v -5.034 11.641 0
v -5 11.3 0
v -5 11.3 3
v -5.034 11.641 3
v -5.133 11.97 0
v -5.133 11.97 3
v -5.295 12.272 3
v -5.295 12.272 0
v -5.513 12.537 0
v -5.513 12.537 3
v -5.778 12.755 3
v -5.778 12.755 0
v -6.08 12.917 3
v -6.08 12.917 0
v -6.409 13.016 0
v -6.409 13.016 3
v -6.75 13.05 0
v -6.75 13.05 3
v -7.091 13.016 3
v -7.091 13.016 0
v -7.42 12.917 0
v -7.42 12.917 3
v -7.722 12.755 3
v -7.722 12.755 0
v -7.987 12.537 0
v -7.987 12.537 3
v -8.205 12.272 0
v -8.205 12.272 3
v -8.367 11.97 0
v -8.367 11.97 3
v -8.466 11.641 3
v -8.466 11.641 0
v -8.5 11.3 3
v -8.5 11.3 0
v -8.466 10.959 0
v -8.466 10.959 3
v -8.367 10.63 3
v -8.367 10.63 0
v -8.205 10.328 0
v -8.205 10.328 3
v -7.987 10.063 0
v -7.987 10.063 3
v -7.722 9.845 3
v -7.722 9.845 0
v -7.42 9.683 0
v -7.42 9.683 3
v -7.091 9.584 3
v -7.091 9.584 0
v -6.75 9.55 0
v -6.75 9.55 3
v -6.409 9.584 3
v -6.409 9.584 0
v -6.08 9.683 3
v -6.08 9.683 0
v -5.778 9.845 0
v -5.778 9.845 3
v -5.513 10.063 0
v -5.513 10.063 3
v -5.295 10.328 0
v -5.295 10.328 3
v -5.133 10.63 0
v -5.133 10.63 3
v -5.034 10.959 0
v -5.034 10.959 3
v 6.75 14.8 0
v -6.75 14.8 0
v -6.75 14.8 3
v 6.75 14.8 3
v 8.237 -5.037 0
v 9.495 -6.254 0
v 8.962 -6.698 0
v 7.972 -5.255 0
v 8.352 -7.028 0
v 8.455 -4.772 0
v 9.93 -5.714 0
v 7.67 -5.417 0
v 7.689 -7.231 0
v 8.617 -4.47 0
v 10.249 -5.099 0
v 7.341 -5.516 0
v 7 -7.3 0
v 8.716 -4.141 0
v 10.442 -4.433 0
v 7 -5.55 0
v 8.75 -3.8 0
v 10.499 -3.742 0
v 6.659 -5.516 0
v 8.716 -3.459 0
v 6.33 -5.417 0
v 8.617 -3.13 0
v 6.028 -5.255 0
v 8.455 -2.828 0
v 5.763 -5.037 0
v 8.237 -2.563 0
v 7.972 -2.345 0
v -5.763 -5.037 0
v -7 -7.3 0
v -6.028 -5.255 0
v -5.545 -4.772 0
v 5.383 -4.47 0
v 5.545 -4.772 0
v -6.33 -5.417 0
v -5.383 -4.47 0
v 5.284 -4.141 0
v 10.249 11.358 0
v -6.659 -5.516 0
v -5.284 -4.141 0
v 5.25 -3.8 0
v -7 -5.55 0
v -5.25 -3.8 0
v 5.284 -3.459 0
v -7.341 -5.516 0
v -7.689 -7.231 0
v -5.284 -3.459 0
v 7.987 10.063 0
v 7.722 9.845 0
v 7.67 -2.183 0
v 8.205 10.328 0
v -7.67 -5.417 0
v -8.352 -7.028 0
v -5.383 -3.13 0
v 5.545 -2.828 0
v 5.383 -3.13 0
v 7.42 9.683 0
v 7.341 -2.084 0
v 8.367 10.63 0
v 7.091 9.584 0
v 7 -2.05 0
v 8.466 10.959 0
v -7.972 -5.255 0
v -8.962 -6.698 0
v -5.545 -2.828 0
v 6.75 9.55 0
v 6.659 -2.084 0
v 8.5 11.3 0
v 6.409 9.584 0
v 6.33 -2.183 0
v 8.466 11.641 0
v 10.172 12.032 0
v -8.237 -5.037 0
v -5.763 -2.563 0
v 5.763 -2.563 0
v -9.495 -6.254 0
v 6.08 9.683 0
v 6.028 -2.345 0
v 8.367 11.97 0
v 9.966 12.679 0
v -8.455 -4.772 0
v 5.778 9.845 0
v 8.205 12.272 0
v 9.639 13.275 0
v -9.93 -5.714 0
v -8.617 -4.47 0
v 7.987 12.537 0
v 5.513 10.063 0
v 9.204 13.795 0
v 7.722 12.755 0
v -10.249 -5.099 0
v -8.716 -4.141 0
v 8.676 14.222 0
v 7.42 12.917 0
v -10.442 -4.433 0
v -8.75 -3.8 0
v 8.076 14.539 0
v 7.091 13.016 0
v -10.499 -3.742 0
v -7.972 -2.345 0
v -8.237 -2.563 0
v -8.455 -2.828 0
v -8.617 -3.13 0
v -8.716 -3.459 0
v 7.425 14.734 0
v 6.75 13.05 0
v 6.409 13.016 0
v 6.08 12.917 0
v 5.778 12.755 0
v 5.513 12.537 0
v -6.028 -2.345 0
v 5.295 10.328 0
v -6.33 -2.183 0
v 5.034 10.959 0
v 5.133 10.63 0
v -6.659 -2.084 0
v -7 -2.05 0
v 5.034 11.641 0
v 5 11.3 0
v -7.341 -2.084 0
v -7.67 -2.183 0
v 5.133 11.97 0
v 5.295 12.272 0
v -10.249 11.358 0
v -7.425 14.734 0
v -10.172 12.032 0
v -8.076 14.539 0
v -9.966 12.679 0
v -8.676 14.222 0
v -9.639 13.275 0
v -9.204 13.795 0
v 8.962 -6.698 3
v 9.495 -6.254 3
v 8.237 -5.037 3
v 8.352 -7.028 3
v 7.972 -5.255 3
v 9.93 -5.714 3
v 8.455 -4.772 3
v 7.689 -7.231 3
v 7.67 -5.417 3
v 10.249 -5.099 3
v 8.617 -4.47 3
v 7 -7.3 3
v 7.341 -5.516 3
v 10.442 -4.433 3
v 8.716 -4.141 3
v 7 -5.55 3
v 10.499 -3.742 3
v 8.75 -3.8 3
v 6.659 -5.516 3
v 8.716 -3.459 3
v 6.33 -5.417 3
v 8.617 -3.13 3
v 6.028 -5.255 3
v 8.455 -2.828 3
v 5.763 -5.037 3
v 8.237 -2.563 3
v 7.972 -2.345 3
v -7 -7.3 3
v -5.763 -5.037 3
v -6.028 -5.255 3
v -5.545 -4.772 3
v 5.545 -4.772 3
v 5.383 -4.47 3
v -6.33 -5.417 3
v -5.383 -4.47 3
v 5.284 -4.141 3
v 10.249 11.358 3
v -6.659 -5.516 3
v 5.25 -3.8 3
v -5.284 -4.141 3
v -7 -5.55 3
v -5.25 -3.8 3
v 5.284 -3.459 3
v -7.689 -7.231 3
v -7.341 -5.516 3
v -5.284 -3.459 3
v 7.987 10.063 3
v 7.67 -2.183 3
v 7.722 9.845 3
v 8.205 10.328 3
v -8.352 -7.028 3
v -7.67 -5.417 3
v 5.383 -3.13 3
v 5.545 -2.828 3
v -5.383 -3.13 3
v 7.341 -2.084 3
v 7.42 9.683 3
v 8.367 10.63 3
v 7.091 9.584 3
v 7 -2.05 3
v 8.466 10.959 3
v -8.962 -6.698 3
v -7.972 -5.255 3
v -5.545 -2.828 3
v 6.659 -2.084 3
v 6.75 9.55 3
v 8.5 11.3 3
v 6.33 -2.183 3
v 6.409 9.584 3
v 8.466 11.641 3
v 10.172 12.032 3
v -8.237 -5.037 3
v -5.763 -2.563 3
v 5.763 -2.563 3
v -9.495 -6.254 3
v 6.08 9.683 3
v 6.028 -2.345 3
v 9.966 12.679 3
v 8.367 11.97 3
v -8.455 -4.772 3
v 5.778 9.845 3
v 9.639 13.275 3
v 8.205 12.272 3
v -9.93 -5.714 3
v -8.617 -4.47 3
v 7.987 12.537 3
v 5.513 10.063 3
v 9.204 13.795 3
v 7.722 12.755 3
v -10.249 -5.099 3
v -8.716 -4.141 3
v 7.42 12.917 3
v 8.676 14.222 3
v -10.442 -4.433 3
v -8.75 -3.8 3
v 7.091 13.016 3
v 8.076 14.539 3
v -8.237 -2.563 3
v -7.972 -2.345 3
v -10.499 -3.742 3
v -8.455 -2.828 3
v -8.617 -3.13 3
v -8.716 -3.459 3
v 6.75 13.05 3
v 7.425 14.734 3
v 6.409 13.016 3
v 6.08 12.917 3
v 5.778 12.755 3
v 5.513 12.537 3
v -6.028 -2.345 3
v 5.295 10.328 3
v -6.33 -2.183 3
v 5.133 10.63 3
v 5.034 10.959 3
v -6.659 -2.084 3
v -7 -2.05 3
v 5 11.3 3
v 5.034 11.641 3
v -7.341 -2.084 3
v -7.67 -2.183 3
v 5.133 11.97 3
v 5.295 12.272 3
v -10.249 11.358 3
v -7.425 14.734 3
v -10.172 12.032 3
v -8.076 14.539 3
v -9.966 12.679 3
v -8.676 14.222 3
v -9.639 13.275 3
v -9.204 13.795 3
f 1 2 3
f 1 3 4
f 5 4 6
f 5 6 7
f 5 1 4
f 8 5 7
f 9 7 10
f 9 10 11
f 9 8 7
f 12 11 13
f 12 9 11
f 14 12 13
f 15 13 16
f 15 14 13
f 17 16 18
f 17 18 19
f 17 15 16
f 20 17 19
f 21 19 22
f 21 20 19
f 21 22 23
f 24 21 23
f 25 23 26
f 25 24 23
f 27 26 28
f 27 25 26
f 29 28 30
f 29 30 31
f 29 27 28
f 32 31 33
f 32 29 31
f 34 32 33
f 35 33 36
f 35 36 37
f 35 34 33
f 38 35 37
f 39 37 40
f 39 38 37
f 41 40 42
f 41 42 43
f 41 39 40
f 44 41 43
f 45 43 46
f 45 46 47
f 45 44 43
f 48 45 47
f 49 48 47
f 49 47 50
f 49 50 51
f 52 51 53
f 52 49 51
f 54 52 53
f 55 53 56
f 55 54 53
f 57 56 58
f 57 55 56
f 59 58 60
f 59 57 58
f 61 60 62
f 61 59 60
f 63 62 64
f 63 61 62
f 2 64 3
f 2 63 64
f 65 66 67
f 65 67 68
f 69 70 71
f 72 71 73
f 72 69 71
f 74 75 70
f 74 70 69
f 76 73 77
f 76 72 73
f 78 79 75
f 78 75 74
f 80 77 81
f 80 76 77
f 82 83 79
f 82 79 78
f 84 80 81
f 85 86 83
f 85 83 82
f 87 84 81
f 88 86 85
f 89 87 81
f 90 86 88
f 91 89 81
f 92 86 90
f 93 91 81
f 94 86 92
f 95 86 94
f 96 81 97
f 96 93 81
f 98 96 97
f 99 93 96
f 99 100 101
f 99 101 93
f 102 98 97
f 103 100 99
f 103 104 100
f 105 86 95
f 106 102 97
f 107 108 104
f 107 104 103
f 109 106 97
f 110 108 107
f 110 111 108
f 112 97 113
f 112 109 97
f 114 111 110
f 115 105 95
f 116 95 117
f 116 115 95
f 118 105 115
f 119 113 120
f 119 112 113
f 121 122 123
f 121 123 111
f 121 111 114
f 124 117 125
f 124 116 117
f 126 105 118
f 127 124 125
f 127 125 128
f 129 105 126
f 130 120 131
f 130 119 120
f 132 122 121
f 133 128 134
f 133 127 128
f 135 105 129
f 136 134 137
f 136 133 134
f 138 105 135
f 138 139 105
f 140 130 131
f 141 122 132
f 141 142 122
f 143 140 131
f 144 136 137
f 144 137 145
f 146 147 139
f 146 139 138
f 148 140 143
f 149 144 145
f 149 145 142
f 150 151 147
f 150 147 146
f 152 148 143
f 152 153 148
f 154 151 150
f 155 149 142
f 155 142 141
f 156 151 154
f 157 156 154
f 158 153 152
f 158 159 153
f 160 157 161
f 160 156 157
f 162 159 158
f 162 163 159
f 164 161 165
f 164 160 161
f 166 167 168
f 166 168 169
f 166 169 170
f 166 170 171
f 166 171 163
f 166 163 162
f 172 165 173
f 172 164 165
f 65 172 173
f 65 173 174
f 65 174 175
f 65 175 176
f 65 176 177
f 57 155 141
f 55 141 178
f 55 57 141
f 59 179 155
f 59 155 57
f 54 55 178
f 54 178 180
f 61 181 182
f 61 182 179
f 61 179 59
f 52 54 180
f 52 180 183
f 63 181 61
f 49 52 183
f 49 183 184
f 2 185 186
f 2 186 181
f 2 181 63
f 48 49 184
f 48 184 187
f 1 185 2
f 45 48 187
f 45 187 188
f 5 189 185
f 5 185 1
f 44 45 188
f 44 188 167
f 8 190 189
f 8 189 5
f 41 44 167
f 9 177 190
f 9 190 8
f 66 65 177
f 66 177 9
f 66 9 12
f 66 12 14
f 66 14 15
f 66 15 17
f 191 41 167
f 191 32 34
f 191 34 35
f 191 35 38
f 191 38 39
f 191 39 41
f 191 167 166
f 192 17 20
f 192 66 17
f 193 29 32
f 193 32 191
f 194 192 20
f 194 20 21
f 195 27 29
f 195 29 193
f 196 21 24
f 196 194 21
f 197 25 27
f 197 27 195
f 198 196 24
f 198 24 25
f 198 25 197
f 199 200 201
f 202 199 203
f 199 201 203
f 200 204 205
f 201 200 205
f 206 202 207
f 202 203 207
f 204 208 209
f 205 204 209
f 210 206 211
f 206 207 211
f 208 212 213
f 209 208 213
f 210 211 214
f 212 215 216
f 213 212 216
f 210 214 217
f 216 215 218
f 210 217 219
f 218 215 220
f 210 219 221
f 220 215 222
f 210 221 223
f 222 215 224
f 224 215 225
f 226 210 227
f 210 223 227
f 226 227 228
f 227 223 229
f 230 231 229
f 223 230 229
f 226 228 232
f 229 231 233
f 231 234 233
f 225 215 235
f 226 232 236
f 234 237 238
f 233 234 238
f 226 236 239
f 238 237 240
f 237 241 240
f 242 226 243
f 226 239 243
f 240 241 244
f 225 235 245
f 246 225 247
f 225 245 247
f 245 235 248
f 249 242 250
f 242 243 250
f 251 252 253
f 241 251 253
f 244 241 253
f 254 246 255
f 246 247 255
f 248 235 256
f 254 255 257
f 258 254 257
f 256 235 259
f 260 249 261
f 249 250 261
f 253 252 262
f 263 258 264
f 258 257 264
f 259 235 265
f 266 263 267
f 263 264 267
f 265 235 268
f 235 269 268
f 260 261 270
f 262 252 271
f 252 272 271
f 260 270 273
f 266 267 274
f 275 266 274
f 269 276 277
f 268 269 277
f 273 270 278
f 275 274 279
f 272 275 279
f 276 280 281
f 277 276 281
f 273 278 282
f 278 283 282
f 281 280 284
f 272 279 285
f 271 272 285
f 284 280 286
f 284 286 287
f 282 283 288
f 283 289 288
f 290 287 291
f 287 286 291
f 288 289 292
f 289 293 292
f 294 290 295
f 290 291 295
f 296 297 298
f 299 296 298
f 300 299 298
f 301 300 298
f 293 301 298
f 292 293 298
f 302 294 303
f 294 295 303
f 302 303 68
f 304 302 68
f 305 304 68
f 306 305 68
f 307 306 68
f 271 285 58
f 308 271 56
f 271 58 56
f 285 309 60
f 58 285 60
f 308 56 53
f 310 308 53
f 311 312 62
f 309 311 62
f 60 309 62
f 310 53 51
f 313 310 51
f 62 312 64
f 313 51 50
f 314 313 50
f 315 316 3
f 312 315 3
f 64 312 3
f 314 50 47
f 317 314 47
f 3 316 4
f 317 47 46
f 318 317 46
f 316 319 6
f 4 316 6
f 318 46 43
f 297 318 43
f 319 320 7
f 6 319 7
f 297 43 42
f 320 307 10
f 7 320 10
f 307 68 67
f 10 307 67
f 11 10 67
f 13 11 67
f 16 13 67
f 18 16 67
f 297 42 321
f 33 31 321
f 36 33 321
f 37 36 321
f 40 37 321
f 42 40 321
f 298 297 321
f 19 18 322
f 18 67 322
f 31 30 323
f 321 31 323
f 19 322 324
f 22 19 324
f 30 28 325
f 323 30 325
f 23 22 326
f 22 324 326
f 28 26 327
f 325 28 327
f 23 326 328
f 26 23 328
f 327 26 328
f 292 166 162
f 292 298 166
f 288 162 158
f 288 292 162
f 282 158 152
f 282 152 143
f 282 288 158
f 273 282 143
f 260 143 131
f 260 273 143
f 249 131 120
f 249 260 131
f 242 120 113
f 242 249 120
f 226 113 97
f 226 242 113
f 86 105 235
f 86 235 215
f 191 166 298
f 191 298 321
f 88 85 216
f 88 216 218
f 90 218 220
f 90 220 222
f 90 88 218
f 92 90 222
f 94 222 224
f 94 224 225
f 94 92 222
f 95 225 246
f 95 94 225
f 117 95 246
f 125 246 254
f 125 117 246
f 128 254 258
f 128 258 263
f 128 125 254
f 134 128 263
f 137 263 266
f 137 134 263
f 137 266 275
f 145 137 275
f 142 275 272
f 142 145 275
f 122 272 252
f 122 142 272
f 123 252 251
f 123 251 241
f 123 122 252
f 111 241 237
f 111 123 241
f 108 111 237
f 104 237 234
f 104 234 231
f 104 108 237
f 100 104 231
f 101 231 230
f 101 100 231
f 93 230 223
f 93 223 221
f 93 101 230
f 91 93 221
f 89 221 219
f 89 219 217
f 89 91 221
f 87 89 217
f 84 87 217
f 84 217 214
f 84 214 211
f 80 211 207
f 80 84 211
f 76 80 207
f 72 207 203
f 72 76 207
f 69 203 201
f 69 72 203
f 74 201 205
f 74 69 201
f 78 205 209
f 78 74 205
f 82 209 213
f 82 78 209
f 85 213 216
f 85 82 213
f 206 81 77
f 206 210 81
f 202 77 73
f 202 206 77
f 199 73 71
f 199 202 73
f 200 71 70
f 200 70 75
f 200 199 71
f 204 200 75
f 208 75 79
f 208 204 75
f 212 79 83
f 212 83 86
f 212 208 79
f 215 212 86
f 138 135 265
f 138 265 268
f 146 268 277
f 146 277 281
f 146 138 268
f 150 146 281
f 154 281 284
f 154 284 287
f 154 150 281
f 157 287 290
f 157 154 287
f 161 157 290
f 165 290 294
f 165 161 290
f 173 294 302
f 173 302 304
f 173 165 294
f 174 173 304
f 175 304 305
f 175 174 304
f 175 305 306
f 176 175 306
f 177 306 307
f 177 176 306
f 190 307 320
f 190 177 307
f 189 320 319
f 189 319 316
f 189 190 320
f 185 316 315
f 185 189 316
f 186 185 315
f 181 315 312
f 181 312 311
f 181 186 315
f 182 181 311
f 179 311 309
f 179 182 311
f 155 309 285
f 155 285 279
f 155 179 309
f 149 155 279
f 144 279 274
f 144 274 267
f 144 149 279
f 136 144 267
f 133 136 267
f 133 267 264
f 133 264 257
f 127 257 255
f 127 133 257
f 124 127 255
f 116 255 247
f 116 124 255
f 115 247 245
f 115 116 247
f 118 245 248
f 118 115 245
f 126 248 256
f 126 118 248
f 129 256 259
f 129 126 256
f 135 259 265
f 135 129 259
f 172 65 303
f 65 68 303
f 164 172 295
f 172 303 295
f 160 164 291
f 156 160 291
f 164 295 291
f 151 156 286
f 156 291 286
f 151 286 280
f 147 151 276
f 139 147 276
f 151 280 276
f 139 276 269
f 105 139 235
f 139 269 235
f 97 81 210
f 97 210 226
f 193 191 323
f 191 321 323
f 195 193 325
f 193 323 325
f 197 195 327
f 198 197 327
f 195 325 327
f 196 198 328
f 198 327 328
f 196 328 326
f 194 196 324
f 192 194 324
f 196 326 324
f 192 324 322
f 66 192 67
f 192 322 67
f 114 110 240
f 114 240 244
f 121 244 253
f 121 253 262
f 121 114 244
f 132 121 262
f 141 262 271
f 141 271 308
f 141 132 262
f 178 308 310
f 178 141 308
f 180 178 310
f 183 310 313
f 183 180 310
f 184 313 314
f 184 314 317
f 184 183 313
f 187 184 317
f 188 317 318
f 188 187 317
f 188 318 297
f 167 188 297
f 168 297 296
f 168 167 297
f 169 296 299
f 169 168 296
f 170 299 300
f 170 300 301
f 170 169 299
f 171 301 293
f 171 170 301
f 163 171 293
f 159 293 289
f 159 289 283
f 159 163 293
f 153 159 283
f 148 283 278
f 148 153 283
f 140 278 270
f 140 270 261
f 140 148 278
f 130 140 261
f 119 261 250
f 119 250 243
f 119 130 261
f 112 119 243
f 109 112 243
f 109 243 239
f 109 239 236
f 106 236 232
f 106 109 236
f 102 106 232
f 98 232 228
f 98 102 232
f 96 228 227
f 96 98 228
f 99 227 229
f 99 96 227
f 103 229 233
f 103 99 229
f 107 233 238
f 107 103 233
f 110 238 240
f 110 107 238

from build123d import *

# Parameters (mm, degrees)
ESQUISSE1_R        = 1.75
BOSS_EXTRU_1_DEPTH = 3
CONG_1_R           = 3.5


with BuildPart() as part:
    # Esquisse1 → Boss.-Extru.1 (new body)
    with BuildSketch(Plane.XY):
        Polygon((-10.55794702, -7.3), (-10.19205298, 14.8), (10.19205298, 14.8), (10.55794702, -7.3), align=None)
        with Locations((-6.75, 11.3)):
            Circle(ESQUISSE1_R, mode=Mode.SUBTRACT)
        with Locations((6.75, 11.3)):
            Circle(ESQUISSE1_R, mode=Mode.SUBTRACT)
        with Locations((-7, -3.8)):
            Circle(ESQUISSE1_R, mode=Mode.SUBTRACT)
        with Locations((7, -3.8)):
            Circle(ESQUISSE1_R, mode=Mode.SUBTRACT)
    extrude(amount=BOSS_EXTRU_1_DEPTH)

    # Congé1
    cong_1_edges = [part.edges().sort_by_distance(p)[0] for p in [
        (-10.55794702, -7.3, 1.5),
        (-10.19205298, 14.8, 1.5),
        (10.19205298, 14.8, 1.5),
        (10.55794702, -7.3, 1.5),
    ]]
    fillet(cong_1_edges, radius=CONG_1_R)


solid = part.part
